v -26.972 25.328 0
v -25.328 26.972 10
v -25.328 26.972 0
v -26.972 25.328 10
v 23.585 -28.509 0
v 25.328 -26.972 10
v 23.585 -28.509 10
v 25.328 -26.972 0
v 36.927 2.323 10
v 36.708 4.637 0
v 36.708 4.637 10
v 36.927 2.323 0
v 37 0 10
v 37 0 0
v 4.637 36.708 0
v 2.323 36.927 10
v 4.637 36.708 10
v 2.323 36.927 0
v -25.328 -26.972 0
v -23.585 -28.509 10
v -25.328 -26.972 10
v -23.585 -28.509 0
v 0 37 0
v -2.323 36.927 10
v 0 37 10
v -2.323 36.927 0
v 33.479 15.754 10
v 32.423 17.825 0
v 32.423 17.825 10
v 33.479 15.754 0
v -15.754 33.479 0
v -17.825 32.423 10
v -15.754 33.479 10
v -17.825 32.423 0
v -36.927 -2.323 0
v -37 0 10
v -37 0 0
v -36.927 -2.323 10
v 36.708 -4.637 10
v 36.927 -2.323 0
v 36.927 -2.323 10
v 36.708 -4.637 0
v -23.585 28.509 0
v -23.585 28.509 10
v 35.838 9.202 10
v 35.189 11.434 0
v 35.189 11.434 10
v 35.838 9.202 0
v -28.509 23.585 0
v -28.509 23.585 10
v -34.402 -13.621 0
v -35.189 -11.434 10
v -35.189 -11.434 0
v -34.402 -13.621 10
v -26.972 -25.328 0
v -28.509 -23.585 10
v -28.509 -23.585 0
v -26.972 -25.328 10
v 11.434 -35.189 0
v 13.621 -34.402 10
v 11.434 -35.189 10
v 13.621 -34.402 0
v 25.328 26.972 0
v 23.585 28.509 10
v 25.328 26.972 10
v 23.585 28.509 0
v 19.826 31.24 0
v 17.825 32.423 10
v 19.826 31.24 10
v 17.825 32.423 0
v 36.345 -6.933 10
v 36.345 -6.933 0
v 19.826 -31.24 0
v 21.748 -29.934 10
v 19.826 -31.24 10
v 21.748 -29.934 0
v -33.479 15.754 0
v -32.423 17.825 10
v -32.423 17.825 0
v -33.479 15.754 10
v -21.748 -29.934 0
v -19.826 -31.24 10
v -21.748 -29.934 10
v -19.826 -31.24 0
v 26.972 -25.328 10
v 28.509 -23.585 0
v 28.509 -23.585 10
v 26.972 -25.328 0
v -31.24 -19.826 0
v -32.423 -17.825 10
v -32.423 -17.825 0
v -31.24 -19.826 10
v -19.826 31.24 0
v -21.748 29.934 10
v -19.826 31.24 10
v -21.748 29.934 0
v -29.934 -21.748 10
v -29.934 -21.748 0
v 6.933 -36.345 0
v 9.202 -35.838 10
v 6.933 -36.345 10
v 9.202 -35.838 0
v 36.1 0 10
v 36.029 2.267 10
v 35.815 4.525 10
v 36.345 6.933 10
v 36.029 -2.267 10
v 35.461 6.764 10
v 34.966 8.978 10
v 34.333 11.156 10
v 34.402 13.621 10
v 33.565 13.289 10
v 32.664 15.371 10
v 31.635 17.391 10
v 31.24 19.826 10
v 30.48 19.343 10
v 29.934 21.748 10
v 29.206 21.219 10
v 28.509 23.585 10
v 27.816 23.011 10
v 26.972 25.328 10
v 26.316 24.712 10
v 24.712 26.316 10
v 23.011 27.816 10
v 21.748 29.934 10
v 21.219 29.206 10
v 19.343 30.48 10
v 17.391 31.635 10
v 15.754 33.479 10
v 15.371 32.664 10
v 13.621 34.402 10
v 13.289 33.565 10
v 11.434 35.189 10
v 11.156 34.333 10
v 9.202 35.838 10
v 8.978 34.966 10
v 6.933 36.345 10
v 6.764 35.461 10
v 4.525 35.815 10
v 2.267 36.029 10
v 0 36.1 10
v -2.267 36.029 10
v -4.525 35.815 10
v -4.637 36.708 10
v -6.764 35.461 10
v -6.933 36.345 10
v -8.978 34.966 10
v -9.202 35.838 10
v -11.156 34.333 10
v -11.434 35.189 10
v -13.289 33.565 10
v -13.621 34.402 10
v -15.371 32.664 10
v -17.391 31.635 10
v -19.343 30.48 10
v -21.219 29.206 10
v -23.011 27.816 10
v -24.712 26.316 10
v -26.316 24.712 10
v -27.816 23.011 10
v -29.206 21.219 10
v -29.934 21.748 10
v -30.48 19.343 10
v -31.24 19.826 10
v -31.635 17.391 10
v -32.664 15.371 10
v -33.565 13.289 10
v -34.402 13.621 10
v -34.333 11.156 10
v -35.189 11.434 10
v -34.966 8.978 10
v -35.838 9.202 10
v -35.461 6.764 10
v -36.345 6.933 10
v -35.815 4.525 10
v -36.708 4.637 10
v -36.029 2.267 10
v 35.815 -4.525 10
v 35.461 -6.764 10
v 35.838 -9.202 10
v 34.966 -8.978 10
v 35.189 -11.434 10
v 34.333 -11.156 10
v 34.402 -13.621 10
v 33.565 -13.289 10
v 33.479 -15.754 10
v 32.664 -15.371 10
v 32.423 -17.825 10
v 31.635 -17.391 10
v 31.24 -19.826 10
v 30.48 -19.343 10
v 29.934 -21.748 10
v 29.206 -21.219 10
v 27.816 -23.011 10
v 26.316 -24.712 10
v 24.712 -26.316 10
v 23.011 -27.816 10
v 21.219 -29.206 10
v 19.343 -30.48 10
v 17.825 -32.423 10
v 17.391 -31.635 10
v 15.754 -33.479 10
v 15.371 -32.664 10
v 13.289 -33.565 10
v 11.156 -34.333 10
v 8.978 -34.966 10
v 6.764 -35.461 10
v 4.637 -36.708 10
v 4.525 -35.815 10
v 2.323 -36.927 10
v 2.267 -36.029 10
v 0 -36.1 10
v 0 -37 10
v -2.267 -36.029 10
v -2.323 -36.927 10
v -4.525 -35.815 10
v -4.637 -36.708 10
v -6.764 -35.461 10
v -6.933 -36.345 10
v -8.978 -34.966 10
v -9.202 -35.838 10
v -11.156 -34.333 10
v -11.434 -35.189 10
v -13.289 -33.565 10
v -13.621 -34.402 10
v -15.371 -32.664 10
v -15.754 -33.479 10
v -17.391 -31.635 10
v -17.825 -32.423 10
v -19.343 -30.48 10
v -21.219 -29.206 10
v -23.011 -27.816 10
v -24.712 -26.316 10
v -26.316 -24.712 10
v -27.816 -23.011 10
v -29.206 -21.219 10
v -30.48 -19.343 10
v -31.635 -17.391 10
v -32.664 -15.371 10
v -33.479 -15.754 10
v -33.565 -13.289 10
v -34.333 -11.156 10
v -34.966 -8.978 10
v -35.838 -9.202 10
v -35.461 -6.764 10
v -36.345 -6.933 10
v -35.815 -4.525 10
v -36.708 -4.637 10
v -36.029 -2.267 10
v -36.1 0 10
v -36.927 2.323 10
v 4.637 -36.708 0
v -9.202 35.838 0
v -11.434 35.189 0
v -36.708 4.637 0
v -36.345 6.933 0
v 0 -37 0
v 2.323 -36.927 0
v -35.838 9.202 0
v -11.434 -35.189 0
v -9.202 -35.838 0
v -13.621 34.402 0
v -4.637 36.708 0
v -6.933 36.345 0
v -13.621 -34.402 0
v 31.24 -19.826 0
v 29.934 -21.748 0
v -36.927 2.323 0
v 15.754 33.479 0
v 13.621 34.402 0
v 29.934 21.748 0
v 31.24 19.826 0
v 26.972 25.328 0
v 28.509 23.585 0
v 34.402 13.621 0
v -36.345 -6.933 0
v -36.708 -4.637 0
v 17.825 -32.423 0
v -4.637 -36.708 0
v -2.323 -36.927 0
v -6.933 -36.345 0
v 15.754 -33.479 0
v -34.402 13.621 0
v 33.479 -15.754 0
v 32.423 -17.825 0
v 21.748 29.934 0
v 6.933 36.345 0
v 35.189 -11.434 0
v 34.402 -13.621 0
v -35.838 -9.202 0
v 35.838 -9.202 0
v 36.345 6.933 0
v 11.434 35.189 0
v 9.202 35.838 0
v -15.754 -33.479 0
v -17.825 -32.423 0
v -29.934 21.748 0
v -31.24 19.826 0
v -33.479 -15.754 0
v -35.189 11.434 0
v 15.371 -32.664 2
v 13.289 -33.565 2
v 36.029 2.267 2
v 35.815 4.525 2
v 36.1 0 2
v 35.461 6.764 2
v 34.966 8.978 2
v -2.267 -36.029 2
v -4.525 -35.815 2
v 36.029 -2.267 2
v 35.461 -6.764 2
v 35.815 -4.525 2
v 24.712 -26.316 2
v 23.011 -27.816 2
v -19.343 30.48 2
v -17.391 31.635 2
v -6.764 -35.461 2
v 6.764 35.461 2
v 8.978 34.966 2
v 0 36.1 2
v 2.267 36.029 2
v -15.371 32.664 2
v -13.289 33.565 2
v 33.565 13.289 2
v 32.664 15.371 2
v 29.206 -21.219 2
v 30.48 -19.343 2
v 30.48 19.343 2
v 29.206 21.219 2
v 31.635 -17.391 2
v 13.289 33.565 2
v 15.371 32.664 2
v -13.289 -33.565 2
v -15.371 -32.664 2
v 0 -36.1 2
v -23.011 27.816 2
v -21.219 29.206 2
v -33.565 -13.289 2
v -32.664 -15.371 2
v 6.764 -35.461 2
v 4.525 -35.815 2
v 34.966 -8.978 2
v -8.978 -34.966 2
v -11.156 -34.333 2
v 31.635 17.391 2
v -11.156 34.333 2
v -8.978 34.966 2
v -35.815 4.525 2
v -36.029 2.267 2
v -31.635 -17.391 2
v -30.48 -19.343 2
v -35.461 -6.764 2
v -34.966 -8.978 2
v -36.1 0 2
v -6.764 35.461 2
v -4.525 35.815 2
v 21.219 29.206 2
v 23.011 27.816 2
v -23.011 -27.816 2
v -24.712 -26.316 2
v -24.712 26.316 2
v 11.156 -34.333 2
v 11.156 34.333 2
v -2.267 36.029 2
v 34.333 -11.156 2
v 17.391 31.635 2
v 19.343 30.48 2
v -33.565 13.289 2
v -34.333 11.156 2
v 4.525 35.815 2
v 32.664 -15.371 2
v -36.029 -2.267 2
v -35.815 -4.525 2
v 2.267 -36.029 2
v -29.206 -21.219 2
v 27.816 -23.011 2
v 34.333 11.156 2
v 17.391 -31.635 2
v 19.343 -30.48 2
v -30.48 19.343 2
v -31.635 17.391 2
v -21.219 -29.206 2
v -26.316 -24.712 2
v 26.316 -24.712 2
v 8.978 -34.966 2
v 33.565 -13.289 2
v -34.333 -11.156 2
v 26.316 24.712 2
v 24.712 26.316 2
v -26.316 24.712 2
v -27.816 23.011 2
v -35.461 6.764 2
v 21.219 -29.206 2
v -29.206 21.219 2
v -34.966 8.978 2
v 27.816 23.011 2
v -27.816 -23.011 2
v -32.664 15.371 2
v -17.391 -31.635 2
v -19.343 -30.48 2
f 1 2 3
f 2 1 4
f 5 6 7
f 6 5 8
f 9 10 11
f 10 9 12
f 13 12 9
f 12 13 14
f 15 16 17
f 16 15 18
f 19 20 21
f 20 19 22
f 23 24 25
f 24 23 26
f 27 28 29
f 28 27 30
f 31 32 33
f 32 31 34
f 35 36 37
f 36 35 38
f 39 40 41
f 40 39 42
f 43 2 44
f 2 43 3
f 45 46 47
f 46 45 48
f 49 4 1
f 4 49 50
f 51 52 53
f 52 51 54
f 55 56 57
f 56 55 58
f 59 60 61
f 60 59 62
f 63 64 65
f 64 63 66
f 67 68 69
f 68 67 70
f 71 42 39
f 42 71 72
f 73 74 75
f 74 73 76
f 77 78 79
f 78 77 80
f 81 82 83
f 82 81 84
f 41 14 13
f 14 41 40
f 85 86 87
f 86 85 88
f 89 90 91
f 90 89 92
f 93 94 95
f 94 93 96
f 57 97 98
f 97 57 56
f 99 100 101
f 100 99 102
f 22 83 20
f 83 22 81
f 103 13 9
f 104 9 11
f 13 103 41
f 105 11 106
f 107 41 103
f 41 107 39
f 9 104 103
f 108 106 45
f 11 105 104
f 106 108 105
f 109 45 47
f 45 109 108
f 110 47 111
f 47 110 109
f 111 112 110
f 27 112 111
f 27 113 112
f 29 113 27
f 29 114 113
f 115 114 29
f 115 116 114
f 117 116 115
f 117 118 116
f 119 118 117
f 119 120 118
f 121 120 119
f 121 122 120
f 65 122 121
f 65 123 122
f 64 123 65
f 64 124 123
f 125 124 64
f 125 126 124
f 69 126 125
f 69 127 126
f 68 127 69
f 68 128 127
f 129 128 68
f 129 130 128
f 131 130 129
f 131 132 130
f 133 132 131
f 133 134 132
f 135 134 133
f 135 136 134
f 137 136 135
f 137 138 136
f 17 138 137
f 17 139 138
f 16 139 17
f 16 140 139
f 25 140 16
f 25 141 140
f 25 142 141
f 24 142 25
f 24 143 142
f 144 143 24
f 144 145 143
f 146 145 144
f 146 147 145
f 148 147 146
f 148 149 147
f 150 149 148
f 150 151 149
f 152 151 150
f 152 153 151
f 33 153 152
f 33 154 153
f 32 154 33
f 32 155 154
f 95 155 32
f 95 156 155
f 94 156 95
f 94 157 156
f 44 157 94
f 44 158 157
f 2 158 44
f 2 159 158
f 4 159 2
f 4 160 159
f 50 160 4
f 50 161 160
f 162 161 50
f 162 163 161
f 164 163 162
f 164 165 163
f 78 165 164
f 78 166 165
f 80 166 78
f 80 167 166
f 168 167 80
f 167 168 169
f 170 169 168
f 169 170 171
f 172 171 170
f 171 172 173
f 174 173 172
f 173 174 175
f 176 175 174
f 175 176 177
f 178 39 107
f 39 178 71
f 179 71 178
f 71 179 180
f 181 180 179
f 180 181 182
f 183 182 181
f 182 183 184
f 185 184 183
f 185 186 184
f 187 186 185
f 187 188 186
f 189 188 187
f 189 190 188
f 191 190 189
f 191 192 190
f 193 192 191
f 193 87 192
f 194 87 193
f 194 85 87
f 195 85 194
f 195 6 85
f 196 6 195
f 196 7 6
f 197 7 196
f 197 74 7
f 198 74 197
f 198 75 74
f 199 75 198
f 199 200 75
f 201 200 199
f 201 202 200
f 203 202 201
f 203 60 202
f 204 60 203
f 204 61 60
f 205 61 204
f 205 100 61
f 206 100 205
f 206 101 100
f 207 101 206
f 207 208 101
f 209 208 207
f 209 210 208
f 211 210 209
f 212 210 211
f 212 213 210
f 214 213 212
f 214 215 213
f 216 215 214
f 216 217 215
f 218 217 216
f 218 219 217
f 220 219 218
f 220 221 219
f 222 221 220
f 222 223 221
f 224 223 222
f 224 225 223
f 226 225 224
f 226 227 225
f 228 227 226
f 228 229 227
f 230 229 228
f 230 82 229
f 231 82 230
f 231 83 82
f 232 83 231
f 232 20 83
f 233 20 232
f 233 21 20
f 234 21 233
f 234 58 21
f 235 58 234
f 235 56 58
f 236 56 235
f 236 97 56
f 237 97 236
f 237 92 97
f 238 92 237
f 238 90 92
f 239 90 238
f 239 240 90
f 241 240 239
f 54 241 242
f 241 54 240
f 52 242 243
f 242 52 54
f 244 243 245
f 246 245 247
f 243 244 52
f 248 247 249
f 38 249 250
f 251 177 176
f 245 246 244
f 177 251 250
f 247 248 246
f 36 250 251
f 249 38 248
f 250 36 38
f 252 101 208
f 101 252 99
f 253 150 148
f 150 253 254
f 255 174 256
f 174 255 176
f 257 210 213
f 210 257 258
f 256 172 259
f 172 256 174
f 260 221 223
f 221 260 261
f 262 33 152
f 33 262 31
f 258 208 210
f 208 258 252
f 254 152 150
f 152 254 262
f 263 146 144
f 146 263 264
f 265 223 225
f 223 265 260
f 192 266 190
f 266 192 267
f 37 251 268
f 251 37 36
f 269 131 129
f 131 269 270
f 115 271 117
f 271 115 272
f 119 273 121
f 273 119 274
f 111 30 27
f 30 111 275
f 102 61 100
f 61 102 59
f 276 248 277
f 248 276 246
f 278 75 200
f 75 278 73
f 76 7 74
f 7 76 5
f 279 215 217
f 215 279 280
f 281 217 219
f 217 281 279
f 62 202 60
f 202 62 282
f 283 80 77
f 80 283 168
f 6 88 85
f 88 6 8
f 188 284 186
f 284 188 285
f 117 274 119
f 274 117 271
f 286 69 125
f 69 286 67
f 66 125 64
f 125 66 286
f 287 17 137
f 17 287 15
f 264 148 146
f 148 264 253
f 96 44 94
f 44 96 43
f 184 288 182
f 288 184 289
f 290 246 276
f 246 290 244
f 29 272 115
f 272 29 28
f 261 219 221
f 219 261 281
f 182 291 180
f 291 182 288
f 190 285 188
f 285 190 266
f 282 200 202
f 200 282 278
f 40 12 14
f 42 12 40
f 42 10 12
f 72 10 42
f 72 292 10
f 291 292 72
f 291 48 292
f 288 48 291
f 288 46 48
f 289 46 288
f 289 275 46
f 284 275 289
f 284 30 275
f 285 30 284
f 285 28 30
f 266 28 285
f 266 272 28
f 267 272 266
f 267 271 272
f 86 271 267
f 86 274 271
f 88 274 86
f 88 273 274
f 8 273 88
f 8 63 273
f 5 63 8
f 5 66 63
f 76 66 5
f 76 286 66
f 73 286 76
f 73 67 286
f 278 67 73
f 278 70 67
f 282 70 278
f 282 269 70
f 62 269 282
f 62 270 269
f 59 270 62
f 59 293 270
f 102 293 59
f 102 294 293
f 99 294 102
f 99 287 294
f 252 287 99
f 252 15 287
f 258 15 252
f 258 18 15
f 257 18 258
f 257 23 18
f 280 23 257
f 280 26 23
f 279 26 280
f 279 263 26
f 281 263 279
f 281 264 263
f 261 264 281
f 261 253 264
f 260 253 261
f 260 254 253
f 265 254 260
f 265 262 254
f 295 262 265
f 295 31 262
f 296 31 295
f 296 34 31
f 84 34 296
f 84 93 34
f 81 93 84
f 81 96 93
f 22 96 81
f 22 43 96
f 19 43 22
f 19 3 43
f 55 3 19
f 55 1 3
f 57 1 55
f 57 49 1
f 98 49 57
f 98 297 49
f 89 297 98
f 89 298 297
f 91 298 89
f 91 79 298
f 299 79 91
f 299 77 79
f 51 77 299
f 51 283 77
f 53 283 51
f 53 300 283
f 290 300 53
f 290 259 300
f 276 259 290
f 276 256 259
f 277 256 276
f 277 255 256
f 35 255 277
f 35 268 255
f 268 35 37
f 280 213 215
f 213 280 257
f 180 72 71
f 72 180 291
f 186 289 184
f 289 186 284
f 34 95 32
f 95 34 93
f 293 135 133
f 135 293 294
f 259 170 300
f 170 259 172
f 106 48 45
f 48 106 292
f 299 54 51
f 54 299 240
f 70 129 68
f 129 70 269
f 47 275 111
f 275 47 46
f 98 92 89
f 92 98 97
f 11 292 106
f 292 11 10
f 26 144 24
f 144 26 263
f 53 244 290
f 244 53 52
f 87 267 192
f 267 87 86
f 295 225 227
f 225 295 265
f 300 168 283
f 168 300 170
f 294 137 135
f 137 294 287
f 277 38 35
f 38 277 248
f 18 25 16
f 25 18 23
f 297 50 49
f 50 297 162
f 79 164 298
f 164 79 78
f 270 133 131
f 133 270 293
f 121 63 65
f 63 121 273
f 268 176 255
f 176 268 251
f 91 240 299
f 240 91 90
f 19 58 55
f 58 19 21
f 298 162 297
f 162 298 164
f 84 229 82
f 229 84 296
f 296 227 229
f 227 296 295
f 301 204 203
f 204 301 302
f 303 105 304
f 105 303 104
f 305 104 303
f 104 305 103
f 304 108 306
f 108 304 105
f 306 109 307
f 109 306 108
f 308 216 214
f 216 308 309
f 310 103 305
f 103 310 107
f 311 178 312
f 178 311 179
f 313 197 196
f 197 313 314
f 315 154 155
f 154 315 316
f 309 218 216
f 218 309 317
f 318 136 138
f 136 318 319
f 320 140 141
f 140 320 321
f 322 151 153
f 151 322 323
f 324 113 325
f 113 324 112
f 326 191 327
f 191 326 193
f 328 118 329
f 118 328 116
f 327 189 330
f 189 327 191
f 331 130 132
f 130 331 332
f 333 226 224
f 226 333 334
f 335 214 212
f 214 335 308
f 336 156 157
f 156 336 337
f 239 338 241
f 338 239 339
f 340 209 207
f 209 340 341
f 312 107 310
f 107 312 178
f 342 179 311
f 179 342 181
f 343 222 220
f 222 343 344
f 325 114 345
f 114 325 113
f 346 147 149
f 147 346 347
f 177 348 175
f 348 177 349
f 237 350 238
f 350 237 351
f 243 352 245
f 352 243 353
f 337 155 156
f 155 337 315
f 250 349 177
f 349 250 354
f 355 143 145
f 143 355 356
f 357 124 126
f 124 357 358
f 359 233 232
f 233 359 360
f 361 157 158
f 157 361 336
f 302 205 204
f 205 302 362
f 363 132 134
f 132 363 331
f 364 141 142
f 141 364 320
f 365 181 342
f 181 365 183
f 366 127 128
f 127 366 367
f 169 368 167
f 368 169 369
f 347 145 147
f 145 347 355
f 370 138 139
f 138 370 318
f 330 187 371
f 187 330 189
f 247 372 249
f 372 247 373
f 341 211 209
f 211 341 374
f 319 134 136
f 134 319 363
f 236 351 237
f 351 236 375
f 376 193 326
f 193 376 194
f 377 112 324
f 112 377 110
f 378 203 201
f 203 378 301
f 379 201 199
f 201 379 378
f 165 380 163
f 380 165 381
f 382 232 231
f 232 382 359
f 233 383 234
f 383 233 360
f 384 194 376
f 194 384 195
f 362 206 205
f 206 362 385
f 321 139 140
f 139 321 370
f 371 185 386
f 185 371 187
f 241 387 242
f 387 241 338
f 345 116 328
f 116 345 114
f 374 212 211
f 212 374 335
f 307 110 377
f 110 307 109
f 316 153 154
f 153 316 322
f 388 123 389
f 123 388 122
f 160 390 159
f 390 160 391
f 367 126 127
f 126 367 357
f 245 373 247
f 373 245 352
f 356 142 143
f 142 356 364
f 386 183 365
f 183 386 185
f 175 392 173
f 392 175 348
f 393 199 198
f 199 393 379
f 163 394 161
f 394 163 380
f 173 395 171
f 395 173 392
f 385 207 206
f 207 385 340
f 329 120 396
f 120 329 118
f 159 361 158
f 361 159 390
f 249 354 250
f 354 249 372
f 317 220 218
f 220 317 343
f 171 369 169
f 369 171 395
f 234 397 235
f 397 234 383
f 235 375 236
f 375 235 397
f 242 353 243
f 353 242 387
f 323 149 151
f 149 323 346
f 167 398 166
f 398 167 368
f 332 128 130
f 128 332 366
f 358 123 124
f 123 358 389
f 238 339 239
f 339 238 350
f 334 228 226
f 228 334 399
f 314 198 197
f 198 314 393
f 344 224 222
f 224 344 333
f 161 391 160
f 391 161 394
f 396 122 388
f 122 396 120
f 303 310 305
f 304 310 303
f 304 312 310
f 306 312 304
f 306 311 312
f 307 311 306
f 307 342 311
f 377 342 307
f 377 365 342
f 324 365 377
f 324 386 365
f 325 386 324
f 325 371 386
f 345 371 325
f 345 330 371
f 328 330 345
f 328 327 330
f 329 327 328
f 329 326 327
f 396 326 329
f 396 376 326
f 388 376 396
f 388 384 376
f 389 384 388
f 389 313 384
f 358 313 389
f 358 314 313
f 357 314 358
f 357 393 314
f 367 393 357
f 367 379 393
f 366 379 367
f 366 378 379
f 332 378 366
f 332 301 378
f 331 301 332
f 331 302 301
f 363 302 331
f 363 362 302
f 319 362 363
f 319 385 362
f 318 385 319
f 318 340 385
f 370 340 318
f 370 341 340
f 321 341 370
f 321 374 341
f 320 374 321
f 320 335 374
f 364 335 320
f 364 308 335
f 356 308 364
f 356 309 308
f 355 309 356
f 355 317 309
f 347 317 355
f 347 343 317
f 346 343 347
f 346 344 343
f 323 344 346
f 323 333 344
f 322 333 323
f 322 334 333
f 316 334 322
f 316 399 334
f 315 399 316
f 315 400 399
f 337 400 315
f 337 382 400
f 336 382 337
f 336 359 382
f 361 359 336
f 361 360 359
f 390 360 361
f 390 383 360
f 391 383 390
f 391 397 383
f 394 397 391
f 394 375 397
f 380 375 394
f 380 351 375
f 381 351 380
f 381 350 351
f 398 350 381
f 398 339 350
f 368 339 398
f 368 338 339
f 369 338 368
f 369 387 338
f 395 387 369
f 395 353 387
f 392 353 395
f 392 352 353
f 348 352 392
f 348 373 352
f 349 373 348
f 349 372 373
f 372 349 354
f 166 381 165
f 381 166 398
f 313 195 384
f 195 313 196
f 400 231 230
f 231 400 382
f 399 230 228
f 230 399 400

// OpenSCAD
$fn = 100;

module main() {
difference() {
    cylinder(60, 36, 36);
    translate([0, 0, 2]) cylinder(60, 35, 35);  
   translate([0, 0, -5]) cylinder(60, 20, 20);  
}


difference() {
    cylinder(6, 27, 27);
    translate([0, 0, -1]) cylinder(12, 26, 26);   
}

}

module top() {
difference() {
    cylinder(10, 37, 37);
translate([0, 0, 2]) cylinder(10, 36.1, 36.1);
}

}

top();
